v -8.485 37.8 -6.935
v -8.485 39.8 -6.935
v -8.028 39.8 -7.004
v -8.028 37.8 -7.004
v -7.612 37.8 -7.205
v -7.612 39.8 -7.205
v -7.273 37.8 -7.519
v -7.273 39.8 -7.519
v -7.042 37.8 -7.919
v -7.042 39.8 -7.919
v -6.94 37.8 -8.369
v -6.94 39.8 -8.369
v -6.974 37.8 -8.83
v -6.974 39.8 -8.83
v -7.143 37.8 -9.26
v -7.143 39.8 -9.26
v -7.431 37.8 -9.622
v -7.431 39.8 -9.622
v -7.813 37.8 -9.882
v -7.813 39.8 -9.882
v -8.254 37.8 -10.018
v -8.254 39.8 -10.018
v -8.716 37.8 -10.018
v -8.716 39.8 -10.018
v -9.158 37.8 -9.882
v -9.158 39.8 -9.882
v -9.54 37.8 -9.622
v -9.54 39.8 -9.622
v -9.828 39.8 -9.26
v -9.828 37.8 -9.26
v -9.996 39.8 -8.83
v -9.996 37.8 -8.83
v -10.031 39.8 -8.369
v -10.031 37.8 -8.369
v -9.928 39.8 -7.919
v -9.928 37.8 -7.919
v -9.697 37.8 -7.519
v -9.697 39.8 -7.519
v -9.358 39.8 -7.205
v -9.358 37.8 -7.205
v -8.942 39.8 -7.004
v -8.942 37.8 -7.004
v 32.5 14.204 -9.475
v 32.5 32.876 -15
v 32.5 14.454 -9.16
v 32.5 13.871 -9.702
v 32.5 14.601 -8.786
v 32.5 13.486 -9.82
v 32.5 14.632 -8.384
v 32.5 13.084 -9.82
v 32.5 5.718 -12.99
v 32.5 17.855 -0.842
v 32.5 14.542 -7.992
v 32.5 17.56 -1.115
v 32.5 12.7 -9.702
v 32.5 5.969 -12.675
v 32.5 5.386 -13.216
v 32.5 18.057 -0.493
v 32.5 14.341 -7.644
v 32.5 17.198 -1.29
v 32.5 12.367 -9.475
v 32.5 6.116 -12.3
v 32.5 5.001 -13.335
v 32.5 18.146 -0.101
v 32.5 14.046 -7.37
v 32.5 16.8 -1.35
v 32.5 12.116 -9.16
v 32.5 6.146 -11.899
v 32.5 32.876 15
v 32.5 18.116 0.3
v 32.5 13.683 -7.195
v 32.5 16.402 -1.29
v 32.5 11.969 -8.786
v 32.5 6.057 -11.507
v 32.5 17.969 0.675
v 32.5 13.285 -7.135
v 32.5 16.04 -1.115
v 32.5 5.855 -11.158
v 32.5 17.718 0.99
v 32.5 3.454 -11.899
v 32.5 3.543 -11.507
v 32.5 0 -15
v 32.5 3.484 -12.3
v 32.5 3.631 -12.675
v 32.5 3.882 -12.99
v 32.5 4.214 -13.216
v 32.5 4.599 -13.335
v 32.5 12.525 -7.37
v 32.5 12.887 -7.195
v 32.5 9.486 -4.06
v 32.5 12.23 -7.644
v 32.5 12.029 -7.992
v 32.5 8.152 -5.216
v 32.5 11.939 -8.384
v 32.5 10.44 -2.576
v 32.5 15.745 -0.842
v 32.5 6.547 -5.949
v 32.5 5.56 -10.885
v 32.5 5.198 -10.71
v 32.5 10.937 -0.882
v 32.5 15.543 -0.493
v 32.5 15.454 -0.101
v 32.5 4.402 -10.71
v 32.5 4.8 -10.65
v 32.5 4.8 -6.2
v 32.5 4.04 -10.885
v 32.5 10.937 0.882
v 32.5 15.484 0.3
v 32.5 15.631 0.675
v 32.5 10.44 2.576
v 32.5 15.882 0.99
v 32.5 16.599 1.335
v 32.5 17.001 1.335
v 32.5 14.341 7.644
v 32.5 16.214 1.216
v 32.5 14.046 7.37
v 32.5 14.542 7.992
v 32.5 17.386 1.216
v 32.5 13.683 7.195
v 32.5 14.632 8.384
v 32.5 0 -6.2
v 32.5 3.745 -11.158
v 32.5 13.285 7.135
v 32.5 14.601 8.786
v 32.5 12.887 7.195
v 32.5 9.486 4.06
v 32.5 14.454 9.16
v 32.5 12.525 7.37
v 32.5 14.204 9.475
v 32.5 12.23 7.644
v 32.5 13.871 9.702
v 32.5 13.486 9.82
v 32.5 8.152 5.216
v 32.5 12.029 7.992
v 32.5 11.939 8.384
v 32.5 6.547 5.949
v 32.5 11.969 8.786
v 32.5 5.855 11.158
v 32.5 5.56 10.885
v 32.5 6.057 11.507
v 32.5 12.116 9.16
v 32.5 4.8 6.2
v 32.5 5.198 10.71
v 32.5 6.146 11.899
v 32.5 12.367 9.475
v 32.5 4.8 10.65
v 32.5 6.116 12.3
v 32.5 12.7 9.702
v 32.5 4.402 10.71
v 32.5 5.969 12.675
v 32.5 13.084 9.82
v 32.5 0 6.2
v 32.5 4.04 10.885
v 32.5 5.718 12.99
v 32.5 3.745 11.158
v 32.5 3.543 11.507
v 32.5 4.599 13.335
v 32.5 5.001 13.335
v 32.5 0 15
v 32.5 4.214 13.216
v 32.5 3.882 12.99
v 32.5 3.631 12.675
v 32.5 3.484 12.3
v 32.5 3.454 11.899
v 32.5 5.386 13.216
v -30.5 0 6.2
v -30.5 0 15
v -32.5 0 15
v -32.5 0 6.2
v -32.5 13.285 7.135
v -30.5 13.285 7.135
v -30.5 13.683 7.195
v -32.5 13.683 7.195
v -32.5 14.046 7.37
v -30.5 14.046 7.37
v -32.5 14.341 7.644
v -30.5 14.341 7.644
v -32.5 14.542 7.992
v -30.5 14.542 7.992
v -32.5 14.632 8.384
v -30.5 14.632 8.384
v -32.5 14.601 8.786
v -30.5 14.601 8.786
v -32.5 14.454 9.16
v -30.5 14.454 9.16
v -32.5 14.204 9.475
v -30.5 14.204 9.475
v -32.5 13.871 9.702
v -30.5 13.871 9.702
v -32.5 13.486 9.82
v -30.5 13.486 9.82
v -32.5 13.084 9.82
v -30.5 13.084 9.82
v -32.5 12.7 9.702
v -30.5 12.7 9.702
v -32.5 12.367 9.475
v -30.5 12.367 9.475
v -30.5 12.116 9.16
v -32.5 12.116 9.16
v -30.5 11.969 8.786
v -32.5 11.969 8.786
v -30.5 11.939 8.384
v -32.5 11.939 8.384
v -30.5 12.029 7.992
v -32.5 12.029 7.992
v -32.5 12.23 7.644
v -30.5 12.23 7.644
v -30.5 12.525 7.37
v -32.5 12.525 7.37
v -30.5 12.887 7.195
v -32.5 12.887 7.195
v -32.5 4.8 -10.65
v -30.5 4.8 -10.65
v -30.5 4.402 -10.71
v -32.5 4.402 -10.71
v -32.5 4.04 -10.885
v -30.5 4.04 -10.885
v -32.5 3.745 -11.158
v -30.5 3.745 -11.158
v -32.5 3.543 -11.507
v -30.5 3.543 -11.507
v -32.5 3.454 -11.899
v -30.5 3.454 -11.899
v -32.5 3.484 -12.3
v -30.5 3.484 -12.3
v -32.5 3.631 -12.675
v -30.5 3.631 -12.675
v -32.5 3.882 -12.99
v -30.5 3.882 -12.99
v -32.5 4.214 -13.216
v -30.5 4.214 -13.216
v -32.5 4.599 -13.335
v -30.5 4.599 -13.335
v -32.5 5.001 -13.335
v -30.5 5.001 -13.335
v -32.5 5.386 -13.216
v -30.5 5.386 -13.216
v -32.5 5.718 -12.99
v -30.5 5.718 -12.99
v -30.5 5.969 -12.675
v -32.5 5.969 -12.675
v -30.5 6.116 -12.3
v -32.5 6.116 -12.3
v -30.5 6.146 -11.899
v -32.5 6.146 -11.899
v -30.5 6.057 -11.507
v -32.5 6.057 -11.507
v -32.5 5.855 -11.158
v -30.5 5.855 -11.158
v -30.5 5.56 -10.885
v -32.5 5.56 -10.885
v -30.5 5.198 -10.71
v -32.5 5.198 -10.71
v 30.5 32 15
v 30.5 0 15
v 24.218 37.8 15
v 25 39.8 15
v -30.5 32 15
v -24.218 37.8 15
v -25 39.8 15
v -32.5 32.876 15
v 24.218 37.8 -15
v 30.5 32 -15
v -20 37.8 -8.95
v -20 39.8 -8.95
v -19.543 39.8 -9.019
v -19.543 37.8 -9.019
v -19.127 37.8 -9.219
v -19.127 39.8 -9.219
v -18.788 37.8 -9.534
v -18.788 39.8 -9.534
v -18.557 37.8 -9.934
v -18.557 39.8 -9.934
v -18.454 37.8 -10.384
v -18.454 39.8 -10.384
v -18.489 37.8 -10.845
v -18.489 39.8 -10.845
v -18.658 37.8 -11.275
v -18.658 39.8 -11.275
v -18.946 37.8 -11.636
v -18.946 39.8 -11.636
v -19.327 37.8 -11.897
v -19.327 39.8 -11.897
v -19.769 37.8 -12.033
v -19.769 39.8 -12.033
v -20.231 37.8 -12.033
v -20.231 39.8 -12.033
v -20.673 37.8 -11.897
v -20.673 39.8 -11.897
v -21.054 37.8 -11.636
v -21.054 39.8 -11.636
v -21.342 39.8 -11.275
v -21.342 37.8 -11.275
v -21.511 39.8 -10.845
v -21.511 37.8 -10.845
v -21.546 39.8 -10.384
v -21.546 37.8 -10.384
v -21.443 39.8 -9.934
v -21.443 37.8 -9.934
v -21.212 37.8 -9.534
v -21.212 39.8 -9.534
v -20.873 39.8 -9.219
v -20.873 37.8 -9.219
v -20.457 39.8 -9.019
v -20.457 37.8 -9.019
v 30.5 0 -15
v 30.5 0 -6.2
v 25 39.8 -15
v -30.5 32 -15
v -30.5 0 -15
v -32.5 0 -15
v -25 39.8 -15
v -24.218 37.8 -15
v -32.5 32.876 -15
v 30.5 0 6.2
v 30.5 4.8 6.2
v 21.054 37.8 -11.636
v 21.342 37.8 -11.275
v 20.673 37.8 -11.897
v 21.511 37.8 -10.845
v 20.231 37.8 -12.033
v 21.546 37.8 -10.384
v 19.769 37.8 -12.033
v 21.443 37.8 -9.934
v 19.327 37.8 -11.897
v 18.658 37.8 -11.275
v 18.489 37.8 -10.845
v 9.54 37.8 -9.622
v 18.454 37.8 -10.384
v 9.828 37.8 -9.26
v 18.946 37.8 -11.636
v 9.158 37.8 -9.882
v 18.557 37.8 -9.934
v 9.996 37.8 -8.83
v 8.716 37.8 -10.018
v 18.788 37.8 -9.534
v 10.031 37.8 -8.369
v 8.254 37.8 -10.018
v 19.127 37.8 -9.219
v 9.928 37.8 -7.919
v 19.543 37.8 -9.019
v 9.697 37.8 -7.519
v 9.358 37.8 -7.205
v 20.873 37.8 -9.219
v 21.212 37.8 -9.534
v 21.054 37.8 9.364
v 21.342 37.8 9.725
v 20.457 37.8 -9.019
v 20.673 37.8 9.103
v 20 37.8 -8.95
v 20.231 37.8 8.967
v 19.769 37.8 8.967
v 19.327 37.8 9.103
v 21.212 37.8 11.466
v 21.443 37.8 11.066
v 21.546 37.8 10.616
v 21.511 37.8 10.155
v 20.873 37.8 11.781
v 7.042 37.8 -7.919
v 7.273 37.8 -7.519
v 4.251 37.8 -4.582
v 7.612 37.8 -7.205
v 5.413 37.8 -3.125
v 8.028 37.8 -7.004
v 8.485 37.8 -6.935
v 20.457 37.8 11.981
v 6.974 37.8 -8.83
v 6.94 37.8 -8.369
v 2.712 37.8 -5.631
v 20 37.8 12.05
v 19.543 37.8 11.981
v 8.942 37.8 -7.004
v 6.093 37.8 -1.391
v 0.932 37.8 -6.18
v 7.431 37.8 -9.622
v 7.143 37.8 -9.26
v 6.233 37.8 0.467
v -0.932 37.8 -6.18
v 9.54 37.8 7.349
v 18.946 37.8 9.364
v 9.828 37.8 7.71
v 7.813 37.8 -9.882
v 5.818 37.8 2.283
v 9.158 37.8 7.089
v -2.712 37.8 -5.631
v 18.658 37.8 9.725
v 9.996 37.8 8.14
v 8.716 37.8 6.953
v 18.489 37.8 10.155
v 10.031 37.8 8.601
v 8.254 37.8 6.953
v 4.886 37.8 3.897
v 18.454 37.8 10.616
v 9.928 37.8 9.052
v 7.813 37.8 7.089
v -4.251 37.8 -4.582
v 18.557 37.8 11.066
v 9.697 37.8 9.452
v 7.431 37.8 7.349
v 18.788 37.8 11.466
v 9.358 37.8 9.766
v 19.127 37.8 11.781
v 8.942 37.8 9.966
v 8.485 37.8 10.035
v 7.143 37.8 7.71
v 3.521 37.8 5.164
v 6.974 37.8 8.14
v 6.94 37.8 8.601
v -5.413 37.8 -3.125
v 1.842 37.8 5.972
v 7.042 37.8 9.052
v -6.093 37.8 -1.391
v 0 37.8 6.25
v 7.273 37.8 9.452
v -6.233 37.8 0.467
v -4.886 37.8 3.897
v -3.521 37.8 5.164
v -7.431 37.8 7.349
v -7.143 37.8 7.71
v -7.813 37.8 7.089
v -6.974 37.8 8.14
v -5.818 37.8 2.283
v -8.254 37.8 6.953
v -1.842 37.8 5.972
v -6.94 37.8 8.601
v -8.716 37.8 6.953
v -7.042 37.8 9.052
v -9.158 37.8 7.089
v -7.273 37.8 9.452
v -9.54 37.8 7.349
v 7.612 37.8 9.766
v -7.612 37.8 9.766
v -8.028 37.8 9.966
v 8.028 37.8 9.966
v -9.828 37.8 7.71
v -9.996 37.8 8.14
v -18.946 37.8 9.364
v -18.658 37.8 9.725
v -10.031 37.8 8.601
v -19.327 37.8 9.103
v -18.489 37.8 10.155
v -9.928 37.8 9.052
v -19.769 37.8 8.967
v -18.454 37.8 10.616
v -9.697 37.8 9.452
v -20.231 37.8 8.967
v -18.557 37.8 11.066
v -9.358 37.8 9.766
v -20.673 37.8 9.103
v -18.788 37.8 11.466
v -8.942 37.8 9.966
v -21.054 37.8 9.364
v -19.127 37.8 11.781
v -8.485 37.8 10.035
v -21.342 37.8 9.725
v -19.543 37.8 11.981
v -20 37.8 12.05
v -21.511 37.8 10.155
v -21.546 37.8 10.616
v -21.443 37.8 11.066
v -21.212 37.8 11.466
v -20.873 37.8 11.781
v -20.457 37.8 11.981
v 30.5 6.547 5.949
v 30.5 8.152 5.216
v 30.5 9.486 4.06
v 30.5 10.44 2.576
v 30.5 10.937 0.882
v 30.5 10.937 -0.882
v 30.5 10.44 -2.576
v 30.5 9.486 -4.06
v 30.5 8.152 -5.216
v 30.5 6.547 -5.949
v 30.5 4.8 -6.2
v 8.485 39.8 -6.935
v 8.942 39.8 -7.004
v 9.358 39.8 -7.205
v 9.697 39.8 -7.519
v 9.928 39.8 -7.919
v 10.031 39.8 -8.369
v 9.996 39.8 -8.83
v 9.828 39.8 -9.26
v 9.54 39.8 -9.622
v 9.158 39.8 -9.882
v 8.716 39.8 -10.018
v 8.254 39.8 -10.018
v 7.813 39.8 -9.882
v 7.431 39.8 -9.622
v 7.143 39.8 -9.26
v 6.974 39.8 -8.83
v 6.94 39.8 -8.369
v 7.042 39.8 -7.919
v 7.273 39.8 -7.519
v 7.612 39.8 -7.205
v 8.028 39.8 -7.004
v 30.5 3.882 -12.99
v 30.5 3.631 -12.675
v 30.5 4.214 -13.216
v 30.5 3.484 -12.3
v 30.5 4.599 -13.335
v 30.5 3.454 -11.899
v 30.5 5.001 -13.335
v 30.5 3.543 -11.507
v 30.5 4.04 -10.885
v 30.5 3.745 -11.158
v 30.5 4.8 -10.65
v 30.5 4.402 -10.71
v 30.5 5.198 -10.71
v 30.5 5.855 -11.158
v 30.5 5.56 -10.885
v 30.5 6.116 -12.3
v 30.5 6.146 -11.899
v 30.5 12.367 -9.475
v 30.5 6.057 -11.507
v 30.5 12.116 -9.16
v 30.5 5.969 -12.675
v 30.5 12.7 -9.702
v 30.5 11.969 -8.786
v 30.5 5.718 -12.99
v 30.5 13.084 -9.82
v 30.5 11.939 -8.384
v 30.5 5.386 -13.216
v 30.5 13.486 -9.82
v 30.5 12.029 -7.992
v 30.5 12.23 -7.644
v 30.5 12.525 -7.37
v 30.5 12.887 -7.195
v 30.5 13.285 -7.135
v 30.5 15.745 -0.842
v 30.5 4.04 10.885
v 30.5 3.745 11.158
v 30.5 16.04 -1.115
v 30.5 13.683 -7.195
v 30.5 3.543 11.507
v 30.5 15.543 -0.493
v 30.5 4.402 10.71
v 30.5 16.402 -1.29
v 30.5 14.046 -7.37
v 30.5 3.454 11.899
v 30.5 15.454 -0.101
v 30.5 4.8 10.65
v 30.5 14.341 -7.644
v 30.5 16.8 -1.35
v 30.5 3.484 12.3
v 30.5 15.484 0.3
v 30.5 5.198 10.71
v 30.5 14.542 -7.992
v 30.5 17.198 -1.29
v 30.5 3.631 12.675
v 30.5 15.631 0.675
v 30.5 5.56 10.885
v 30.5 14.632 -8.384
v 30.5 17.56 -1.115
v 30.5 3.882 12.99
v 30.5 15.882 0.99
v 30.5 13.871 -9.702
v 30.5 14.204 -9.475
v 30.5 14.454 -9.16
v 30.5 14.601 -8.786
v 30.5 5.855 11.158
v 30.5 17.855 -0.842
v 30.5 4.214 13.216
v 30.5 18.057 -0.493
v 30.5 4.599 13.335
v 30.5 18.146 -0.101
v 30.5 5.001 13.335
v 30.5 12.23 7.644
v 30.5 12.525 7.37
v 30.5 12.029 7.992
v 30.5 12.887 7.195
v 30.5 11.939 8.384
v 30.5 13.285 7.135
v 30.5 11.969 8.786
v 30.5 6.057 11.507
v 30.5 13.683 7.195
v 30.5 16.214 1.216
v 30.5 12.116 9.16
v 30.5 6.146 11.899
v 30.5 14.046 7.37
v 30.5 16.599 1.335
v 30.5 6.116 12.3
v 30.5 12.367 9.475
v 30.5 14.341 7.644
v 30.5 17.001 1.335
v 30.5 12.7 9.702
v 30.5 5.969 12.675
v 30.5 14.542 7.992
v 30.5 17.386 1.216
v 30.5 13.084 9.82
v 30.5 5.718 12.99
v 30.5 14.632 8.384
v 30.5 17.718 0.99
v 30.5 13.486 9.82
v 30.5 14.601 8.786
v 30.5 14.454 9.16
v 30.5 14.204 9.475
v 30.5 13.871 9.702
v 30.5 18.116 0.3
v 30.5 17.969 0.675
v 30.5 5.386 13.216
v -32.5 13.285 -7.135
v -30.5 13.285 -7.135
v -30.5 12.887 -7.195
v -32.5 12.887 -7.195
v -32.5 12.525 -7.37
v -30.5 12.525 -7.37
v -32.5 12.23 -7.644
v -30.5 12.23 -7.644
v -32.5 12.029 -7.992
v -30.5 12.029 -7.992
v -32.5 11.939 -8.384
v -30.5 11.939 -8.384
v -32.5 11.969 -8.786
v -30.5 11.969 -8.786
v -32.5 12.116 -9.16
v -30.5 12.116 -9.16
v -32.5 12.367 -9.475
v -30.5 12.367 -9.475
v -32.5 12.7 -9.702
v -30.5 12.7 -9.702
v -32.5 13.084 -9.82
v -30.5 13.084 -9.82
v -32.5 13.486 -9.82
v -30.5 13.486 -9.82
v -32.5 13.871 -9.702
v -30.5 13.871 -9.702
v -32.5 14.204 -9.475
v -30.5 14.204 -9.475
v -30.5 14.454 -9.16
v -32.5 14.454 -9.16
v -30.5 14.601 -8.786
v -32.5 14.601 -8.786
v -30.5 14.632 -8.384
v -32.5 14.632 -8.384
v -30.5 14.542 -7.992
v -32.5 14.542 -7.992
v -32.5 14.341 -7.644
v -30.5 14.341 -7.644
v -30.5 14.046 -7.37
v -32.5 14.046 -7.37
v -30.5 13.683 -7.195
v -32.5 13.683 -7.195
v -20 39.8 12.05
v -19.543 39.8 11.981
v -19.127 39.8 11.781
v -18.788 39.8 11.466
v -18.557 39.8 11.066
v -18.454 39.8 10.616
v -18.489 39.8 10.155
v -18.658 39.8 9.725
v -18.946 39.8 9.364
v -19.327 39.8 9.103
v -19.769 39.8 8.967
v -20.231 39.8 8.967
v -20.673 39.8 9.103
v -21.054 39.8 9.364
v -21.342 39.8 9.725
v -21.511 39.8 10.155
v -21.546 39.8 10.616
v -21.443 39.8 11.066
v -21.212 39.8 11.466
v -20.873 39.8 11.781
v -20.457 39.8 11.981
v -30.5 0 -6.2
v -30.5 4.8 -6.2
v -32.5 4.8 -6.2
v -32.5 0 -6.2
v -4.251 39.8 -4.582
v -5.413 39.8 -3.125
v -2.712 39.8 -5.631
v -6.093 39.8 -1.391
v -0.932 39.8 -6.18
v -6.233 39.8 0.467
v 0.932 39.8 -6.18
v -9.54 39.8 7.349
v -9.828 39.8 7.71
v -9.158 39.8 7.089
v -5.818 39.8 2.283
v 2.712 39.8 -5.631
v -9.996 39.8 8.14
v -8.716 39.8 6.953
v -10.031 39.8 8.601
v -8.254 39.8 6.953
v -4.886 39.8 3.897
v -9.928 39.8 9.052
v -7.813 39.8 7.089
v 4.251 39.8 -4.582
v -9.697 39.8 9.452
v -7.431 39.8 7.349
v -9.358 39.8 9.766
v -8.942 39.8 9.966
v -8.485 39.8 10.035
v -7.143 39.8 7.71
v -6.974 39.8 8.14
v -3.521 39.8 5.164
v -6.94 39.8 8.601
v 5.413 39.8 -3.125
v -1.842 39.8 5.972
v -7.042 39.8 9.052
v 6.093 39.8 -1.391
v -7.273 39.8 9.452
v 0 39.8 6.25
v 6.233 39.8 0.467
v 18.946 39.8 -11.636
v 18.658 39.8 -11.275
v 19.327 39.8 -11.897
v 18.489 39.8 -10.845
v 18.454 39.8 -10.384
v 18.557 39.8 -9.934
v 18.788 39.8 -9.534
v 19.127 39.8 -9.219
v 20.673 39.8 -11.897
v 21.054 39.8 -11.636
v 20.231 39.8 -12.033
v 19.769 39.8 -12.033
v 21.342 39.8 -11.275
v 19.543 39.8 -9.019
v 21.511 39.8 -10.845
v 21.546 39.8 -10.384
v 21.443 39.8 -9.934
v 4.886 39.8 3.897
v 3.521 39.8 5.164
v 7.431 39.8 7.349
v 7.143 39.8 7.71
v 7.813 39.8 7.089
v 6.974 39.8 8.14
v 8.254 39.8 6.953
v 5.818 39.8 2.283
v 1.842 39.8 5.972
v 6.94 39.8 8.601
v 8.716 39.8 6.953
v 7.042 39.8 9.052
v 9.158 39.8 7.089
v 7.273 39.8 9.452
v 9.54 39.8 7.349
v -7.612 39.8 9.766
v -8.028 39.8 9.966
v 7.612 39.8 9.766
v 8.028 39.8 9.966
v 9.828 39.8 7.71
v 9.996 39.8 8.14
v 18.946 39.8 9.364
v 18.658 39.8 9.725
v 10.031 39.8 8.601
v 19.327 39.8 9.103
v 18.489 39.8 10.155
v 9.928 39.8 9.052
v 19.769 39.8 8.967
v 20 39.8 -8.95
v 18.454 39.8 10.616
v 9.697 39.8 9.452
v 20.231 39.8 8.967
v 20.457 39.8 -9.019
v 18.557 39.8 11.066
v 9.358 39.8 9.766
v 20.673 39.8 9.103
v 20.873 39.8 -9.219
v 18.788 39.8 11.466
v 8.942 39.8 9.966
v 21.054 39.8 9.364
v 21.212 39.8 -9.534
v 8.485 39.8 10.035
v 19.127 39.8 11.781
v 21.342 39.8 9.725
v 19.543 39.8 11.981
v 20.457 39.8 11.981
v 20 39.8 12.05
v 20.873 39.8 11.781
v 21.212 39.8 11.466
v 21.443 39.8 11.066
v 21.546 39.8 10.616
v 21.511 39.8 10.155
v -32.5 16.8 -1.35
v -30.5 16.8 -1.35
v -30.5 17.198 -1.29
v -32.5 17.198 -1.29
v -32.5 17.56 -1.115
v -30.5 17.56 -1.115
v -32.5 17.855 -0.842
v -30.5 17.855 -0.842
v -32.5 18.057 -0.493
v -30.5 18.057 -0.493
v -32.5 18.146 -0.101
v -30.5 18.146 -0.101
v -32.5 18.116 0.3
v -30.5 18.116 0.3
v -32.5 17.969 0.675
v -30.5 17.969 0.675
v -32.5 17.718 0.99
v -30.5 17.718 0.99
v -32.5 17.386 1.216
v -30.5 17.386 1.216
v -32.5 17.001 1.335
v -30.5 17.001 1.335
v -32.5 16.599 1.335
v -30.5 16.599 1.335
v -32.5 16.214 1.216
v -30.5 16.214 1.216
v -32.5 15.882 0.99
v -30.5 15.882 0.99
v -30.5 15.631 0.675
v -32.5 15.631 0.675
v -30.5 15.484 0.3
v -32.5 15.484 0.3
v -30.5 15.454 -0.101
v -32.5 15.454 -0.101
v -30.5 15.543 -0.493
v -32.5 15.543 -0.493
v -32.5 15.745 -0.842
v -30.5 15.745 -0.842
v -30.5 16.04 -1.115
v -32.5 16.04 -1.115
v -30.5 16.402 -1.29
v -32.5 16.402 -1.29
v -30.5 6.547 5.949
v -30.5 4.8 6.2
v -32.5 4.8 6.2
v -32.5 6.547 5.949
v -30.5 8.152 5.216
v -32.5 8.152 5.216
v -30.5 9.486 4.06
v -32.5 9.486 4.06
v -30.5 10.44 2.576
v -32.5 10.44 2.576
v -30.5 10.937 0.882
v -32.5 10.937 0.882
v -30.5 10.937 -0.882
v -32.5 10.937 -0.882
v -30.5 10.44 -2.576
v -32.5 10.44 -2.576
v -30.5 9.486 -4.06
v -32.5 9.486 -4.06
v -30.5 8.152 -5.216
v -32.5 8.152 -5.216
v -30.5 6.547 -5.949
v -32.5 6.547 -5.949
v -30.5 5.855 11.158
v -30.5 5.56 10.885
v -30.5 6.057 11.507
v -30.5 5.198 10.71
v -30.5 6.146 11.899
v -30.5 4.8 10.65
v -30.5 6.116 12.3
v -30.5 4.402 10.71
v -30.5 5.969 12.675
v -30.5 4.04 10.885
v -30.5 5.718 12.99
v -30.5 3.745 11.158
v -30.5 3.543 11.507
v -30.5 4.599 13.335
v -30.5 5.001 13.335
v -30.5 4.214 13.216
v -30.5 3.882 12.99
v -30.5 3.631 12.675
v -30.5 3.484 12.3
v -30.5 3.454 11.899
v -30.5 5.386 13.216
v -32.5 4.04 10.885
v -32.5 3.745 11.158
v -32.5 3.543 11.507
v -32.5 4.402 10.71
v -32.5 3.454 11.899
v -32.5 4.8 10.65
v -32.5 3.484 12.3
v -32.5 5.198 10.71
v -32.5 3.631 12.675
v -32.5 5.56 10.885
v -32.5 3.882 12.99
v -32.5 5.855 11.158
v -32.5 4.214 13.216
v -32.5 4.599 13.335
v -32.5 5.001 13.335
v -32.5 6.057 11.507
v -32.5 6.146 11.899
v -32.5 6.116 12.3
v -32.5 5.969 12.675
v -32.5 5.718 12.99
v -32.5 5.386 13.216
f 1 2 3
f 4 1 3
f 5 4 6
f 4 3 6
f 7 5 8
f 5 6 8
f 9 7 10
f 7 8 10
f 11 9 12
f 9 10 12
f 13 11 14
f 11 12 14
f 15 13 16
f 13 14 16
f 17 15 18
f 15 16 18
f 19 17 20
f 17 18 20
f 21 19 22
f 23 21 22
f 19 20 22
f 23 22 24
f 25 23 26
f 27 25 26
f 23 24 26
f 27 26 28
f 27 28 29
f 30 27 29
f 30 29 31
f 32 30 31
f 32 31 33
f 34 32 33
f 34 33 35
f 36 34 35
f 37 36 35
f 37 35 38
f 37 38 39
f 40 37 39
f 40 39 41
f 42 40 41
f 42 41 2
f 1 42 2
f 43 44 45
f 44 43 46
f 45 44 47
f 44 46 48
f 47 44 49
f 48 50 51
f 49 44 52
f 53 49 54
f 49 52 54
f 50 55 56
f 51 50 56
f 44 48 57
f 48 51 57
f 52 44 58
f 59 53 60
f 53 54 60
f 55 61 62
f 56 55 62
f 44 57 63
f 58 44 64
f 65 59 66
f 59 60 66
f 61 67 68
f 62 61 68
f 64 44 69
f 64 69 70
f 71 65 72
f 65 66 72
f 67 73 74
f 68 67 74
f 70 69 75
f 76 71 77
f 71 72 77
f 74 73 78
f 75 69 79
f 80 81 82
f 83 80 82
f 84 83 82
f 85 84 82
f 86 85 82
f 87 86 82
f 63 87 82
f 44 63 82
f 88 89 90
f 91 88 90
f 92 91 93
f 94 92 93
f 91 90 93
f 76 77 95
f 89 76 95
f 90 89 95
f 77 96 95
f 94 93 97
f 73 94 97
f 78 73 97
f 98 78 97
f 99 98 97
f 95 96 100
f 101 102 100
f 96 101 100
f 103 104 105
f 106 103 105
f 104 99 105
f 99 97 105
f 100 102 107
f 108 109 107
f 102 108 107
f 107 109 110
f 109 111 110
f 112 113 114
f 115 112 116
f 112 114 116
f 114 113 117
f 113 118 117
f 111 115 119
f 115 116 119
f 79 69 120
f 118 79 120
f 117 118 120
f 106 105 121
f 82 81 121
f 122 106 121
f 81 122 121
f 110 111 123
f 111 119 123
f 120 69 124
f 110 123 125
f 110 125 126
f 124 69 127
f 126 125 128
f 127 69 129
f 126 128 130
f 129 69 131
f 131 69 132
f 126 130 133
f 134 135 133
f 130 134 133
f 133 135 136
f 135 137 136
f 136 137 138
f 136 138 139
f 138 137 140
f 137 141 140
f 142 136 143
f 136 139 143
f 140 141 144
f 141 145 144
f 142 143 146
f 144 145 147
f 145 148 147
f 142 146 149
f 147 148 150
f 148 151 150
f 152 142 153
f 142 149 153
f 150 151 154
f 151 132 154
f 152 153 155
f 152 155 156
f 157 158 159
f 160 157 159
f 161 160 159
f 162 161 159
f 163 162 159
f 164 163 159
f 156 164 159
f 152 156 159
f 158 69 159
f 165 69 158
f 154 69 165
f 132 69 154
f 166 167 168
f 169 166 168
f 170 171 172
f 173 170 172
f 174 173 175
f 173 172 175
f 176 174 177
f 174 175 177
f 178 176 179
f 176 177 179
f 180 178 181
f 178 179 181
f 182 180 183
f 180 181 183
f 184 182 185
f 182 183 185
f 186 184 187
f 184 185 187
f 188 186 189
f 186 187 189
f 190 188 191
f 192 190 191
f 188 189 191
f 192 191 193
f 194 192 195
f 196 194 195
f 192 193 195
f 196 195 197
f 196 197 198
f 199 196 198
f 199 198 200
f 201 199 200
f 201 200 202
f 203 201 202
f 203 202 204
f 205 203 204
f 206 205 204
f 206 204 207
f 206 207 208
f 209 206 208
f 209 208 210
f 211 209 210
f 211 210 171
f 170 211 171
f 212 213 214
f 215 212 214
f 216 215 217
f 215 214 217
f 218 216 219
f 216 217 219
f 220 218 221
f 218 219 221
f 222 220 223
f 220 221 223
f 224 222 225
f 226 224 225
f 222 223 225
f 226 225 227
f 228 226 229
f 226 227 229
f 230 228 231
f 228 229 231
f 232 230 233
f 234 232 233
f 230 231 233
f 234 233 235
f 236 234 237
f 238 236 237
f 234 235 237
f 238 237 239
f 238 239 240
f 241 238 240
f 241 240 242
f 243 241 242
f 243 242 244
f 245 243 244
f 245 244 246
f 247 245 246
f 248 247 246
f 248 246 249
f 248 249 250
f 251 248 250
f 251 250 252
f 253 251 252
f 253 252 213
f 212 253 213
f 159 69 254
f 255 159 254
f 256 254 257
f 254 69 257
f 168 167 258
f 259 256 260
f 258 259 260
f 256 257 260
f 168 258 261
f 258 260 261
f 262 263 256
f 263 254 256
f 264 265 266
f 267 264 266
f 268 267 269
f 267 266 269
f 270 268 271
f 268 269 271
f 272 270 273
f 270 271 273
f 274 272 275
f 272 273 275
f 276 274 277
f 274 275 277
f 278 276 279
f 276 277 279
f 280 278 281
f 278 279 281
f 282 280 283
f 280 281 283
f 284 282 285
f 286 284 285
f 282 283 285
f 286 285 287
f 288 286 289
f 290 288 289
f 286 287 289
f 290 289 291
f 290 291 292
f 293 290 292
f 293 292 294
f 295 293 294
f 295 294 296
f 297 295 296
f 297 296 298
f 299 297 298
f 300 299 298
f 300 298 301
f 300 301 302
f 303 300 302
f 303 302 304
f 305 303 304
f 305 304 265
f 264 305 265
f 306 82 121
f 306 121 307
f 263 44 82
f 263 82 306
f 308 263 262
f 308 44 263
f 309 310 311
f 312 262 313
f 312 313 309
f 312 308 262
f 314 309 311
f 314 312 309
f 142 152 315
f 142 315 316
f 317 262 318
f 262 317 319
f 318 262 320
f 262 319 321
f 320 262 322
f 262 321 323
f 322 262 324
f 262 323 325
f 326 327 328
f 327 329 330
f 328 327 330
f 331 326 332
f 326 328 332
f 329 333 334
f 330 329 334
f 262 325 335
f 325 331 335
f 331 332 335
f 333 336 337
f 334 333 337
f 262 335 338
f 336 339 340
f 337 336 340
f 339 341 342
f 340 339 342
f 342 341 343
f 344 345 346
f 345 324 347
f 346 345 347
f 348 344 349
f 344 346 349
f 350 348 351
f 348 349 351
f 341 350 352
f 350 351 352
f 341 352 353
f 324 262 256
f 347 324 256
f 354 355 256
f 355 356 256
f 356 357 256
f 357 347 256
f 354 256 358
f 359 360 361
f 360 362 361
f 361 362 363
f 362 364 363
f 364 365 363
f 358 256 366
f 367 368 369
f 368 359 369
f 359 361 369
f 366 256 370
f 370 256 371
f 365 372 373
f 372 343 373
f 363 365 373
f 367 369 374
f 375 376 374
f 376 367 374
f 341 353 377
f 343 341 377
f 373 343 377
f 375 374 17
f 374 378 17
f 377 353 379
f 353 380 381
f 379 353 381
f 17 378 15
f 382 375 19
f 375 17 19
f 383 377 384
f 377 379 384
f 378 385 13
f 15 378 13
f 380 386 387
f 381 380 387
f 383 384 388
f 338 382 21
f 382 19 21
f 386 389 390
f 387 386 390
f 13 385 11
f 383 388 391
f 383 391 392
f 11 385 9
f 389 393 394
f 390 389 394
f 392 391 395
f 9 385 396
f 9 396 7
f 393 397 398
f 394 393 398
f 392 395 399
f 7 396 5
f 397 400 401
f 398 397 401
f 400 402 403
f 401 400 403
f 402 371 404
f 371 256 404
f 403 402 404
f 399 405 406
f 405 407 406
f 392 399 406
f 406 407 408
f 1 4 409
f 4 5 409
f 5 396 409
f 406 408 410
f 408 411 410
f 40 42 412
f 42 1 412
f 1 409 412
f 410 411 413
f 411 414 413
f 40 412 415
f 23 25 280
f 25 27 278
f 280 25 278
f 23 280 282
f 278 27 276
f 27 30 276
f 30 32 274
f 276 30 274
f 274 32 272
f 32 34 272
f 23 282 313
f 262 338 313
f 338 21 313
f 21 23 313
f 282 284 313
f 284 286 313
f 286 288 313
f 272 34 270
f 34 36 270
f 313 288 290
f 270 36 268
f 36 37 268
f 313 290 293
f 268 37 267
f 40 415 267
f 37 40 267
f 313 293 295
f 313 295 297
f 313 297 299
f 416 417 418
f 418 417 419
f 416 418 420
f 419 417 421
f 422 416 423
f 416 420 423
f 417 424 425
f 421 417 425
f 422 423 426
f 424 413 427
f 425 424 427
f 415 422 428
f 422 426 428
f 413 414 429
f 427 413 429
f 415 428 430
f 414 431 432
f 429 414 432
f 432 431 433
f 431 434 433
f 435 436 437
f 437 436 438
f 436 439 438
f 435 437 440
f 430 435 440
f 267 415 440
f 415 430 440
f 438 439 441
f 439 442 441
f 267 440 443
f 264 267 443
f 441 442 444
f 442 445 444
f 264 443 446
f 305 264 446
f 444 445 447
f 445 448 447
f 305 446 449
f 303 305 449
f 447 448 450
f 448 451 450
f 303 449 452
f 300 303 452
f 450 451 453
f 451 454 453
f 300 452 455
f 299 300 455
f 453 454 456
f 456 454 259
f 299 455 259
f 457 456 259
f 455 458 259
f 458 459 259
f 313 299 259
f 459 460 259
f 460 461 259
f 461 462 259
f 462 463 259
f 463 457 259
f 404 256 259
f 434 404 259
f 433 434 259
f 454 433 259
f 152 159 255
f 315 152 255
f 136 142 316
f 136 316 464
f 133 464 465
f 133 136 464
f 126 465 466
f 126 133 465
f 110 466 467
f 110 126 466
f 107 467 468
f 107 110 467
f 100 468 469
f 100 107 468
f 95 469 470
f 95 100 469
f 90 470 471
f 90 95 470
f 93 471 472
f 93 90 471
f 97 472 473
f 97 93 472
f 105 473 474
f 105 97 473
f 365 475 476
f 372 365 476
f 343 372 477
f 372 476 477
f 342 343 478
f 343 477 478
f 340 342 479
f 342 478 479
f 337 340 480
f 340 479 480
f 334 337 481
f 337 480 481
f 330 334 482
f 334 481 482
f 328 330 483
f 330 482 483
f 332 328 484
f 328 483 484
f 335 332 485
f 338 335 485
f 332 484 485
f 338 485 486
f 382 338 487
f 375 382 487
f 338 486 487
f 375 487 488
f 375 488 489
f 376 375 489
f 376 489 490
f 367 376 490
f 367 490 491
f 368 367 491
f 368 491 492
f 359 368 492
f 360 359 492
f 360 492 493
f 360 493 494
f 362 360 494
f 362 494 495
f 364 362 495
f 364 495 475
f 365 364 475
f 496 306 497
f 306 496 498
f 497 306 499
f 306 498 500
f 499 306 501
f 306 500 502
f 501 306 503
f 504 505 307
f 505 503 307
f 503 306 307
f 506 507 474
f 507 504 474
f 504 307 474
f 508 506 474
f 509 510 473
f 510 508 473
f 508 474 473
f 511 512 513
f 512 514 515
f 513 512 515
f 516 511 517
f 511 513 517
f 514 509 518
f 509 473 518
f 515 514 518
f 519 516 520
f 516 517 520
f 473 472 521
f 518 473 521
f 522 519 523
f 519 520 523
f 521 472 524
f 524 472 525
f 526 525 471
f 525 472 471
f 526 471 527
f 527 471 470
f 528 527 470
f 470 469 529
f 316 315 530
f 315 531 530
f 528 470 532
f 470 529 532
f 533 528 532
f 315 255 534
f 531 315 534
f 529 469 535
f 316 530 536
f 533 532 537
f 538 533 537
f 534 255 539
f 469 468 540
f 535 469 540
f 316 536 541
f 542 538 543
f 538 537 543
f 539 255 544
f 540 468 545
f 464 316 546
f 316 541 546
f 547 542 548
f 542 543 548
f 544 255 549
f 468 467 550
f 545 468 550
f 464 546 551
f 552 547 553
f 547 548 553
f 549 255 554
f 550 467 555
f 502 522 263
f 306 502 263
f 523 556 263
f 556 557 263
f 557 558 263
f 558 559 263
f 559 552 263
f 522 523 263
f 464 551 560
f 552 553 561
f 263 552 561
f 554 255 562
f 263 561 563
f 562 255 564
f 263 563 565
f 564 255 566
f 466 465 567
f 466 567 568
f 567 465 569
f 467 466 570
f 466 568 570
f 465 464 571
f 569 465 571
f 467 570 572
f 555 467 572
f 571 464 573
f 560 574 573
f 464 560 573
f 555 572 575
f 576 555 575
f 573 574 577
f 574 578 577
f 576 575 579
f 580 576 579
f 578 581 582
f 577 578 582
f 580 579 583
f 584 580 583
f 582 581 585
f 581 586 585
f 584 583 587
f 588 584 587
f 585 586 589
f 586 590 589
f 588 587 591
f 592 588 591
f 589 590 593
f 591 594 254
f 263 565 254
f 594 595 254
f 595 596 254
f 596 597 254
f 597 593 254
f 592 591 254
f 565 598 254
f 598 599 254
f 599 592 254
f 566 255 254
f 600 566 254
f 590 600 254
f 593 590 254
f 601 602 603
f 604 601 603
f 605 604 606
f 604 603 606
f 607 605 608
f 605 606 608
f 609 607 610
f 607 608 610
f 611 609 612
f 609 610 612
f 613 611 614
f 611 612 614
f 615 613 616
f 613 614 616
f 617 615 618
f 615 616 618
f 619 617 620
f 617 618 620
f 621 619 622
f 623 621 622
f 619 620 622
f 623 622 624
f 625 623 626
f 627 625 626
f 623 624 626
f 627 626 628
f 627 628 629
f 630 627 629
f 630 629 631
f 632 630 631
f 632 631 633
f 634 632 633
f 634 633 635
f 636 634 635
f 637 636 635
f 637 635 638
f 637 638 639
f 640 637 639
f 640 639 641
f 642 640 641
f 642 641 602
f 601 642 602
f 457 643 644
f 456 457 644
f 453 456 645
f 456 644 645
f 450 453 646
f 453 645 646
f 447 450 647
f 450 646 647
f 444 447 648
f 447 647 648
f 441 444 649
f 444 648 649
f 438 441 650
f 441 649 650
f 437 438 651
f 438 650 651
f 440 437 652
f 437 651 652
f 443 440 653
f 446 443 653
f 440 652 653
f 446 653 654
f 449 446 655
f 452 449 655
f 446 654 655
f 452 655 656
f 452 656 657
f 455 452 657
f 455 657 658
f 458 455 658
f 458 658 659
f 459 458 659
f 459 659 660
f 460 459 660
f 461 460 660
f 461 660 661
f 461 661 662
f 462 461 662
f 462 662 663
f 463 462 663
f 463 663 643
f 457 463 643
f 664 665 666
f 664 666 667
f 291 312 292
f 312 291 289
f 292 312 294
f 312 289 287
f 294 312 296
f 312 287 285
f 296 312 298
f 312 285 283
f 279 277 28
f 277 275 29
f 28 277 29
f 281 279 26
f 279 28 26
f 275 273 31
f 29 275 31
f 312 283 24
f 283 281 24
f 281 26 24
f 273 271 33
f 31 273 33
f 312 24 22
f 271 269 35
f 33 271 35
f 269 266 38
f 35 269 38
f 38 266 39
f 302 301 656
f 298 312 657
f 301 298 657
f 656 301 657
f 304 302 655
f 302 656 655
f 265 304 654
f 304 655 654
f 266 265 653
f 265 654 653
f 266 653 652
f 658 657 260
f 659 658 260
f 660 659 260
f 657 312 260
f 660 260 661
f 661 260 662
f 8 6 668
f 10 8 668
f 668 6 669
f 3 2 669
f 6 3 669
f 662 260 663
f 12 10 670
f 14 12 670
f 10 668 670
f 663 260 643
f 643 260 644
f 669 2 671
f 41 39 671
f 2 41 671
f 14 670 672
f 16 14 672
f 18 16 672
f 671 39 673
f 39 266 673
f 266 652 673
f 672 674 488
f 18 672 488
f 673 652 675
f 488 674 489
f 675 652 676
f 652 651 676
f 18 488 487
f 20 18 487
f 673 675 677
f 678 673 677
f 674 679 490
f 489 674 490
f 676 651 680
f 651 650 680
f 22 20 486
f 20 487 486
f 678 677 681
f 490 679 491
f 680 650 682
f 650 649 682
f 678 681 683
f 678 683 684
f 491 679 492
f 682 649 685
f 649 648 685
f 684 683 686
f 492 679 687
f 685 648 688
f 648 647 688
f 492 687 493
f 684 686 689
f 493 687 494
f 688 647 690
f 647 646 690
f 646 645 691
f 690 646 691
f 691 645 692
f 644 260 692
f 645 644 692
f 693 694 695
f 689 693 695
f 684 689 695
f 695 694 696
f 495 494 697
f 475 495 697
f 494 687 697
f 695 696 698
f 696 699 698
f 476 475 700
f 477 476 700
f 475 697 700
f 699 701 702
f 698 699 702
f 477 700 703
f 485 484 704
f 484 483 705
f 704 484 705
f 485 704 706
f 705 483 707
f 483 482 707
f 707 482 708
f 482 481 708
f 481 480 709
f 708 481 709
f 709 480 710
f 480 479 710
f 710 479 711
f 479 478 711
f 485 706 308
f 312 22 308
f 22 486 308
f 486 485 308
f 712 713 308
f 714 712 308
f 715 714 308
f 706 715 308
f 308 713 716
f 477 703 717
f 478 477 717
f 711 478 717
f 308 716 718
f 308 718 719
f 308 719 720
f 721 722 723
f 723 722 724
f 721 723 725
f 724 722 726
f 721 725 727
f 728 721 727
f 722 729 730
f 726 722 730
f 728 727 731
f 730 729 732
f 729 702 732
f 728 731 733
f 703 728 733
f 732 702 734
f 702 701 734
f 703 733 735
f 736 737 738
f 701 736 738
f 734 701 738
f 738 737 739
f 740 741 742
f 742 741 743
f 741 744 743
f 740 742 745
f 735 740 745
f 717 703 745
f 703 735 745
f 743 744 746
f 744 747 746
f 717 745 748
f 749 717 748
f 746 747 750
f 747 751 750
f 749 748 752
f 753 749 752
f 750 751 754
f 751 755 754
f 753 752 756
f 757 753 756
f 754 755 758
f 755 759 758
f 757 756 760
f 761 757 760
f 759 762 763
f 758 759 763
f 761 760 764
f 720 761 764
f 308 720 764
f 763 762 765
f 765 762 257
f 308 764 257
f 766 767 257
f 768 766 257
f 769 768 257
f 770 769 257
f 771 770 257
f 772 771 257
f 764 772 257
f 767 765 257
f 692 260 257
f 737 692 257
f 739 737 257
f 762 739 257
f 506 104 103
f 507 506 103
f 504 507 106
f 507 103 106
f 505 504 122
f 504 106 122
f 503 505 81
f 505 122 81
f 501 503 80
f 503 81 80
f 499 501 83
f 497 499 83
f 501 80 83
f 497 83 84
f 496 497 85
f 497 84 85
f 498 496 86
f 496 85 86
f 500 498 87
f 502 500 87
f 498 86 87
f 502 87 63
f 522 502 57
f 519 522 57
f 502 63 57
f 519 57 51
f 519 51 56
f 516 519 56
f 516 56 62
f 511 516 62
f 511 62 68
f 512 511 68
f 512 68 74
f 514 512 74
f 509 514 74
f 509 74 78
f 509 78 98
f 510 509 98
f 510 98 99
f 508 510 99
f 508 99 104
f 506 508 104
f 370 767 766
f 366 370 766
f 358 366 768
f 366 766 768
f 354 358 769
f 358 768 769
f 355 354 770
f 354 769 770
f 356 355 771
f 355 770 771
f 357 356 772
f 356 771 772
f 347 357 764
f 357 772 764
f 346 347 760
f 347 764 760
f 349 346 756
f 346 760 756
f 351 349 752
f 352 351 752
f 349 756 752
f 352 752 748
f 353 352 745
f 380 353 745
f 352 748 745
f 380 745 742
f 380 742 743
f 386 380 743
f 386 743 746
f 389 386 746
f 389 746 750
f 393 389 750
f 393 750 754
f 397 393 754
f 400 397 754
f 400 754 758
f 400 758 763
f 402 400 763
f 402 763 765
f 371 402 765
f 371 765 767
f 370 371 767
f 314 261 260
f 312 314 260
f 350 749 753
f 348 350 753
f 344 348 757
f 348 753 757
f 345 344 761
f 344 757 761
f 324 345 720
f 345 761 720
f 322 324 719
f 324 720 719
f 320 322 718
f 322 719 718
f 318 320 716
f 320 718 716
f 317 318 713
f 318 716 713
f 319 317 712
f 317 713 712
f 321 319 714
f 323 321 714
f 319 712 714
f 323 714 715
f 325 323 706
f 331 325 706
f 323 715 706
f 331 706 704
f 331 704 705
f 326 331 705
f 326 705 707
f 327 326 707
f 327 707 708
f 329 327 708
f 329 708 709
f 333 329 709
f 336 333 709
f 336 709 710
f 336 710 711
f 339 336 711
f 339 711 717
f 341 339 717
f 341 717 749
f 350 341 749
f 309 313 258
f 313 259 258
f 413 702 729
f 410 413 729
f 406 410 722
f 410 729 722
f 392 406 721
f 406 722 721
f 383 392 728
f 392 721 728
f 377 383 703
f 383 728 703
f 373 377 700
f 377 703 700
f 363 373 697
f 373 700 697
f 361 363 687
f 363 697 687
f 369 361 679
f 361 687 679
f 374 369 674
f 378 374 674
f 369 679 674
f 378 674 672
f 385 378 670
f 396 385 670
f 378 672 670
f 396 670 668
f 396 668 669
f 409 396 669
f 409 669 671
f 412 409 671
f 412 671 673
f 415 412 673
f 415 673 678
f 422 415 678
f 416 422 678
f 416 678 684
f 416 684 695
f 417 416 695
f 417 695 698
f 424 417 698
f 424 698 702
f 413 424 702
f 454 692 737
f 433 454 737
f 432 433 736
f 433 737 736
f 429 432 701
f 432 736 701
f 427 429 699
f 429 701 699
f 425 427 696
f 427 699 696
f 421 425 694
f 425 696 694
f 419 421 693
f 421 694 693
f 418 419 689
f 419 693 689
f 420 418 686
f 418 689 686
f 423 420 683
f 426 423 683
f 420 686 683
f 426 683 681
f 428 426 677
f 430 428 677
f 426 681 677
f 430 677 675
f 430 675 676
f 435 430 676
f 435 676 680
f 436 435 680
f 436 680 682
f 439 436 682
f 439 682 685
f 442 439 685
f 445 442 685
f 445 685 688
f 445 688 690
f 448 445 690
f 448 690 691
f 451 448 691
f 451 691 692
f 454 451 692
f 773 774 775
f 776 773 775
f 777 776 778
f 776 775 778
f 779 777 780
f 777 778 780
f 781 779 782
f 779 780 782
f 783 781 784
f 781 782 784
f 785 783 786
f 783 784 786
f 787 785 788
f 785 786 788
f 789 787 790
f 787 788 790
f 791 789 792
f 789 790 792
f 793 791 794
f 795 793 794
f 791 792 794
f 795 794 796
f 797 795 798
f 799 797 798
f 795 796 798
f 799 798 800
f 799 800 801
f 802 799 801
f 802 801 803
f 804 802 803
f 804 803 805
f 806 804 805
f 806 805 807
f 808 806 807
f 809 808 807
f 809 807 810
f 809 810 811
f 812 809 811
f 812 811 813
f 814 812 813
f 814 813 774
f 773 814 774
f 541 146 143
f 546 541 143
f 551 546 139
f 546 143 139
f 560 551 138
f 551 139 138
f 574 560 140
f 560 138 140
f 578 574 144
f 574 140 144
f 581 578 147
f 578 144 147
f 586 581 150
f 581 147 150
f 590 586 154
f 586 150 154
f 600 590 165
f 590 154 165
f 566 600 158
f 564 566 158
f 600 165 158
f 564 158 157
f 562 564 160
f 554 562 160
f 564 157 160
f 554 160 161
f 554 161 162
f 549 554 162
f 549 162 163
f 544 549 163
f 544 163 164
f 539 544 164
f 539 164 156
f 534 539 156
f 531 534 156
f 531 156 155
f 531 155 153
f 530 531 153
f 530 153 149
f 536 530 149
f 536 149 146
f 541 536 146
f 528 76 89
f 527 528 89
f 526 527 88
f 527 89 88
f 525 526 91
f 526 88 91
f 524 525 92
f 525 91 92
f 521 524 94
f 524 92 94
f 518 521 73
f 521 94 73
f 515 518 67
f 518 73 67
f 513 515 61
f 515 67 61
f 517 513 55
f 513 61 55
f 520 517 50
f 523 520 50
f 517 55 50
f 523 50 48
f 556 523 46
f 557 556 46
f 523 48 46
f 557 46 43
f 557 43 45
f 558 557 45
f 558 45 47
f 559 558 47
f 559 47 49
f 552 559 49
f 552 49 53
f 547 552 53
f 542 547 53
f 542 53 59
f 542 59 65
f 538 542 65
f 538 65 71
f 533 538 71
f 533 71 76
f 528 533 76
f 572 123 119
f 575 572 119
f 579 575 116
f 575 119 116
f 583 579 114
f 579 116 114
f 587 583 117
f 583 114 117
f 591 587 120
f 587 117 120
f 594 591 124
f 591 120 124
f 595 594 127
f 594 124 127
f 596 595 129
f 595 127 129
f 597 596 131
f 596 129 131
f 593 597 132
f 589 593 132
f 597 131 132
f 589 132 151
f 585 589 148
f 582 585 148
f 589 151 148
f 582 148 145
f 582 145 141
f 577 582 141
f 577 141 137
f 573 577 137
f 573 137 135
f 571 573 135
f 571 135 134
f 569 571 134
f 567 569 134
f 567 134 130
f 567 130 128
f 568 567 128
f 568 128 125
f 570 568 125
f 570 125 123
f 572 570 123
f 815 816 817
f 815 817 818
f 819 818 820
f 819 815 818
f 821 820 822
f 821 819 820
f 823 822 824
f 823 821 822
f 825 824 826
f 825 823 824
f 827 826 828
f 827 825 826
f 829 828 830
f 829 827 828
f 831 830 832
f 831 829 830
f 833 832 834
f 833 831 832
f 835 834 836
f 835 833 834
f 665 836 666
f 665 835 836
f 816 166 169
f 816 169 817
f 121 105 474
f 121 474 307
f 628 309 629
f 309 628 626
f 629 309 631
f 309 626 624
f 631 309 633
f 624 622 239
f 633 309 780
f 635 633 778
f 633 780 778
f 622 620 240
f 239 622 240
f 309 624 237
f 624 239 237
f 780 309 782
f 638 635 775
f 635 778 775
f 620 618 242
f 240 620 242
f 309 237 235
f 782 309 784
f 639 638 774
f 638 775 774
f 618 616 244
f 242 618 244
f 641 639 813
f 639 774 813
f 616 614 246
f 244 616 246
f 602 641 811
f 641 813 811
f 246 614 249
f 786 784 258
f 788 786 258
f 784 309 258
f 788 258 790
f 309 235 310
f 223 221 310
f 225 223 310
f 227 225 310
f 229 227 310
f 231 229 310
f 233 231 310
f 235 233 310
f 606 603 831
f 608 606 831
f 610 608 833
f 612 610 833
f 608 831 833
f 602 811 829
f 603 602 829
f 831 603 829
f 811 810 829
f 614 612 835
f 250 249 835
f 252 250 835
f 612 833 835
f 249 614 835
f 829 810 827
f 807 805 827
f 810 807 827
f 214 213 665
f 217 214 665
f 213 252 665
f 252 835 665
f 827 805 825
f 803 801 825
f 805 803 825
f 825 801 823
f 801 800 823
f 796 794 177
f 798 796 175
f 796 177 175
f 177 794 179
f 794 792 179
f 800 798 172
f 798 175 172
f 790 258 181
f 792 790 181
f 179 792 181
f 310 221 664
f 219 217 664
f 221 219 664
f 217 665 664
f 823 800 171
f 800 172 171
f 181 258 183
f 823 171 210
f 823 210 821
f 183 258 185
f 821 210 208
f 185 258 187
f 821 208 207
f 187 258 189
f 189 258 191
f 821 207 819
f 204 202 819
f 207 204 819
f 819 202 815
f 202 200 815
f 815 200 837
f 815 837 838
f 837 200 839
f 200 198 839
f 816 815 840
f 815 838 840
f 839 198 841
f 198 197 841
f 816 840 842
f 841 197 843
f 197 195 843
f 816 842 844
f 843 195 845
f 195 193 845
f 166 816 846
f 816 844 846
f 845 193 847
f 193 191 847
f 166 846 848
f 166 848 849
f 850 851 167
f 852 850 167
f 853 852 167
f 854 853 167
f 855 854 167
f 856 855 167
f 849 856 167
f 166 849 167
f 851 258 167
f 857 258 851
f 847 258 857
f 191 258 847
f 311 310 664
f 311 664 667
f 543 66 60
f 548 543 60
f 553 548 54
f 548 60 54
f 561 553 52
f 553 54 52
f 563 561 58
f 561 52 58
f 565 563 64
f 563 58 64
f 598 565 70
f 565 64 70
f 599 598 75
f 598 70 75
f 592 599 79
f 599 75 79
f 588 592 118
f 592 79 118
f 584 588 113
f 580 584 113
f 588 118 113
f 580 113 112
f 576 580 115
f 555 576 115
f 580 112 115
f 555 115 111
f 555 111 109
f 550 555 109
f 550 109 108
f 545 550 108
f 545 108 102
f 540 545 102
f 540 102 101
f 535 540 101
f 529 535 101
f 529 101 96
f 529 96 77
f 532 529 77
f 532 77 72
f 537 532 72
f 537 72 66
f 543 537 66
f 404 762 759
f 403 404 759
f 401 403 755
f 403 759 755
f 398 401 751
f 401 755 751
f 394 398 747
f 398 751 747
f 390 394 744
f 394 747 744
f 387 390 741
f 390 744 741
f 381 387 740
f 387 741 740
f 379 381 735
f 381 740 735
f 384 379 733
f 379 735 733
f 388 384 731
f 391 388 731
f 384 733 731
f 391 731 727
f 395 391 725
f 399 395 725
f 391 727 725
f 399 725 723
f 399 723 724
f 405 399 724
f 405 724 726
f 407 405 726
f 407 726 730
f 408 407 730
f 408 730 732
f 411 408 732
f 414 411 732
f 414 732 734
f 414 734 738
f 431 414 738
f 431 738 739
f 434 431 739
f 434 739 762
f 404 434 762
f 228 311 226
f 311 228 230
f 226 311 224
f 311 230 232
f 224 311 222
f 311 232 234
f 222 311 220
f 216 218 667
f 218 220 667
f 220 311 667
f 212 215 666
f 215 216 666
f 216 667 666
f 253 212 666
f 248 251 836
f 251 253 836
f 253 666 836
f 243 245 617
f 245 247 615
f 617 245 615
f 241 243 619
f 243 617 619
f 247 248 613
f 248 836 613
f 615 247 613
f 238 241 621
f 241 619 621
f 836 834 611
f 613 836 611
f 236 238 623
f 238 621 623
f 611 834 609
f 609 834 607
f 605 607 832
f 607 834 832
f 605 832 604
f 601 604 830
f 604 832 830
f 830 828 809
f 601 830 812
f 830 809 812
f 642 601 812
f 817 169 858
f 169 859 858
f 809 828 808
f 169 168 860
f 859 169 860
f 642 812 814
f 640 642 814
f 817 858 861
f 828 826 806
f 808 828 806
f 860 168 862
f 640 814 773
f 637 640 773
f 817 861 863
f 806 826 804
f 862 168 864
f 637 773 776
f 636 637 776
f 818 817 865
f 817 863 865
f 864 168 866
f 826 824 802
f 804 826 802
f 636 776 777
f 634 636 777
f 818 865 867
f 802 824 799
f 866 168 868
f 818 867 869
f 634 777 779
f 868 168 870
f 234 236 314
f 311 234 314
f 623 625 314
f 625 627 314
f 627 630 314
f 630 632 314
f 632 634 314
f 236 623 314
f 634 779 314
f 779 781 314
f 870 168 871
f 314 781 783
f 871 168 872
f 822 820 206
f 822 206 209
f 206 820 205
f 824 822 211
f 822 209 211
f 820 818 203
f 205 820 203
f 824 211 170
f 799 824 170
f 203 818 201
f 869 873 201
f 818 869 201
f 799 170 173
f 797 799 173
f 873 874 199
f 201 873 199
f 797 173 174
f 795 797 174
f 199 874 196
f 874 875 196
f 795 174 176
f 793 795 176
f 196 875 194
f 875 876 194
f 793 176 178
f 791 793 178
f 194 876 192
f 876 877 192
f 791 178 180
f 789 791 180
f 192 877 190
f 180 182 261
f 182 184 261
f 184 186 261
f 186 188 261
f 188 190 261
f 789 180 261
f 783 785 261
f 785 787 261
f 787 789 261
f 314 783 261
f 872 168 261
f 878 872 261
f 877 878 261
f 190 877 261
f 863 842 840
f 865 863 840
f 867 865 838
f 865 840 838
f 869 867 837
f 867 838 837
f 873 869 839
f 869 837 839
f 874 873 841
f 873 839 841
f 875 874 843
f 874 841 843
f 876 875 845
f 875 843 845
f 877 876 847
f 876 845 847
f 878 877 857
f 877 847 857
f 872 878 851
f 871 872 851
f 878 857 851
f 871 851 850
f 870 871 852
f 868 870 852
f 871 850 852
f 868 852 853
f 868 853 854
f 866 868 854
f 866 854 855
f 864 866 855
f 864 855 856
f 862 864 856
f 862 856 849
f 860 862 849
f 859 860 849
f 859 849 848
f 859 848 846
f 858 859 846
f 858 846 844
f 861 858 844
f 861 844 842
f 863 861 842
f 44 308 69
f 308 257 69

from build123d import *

# Parameters (mm, degrees)
BOSS_EXTRU_1_DEPTH      = 15
ESQUISSE3_R             = 6.25
ESQUISSE3_R_2           = 1.55
ENL_V_MAT_EXTRU_1_DEPTH = 54.528403675
ESQUISSE4_R             = 1.35
ENL_V_MAT_EXTRU_2_DEPTH = 78.679083414


with BuildPart() as part:
    # Esquisse1 → Boss.-Extru.1 (new, symmetric)
    with BuildSketch(Plane.XY):
        Polygon((-25, 39.8), (25, 39.8), (32.5, 32.875544179), (32.5, 0), (30.5, 0), (30.5, 32), (24.217917895, 37.8), (-24.217917895, 37.8), (-30.5, 32), (-30.5, 0), (-32.5, 0), (-32.5, 32.875544179), align=None)
    extrude(amount=BOSS_EXTRU_1_DEPTH, both=True)

    # Esquisse3 → Enlèv. mat.-Extru.1 (cut, through all)
    with BuildSketch(Plane(origin=(0, 39.8, 0), x_dir=(1, 0, 0), z_dir=(0, 1, 0))):
        with Locations(Location((0, 0, 0), (0, 0, 270))):
            Circle(ESQUISSE3_R)
        with Locations(Location((-8.485281374, 8.485281374, 0), (0, 0, 270))):
            Circle(ESQUISSE3_R_2)
        with Locations(Location((-8.485281374, -8.485281374, 0), (0, 0, 270))):
            Circle(ESQUISSE3_R_2)
        with Locations(Location((8.485281374, -8.485281374, 0), (0, 0, 270))):
            Circle(ESQUISSE3_R_2)
        with Locations(Location((8.485281374, 8.485281374, 0), (0, 0, 270))):
            Circle(ESQUISSE3_R_2)
        with Locations(Location((20, 10.5, 0), (0, 0, 270))):
            Circle(ESQUISSE3_R_2)
        with Locations(Location((-20, 10.5, 0), (0, 0, 270))):
            Circle(ESQUISSE3_R_2)
        with Locations(Location((20, -10.5, 0), (0, 0, 270))):
            Circle(ESQUISSE3_R_2)
        with Locations(Location((-20, -10.5, 0), (0, 0, 270))):
            Circle(ESQUISSE3_R_2)
    extrude(amount=-ENL_V_MAT_EXTRU_1_DEPTH, mode=Mode.SUBTRACT)

    # Esquisse4 → Enlèv. mat.-Extru.2 (cut, through all)
    with BuildSketch(Plane(origin=(32.5, 0, 0), x_dir=(0, 0, -1), z_dir=(1, 0, 0))):
        with Locations((-12, 4.8)):
            Circle(ESQUISSE4_R)
        with Locations((0, 16.8)):
            Circle(ESQUISSE4_R)
        with Locations((-8.485281374, 13.285281374)):
            Circle(ESQUISSE4_R)
        with Locations(Location((12, 4.8, 0), (0, 0, 180))):
            Circle(ESQUISSE4_R)
        with Locations(Location((8.485281374, 13.285281374, 0), (0, 0, 180))):
            Circle(ESQUISSE4_R)
        with BuildLine():
            Line((-6.2, 0), (-6.2, 4.8))
            ThreePointArc((-6.2, 4.8), (0, 11), (6.2, 4.8))
            Line((6.2, 4.8), (6.2, 0))
            Line((6.2, 0), (-6.2, 0))
        make_face()
    extrude(amount=-ENL_V_MAT_EXTRU_2_DEPTH, mode=Mode.SUBTRACT)


solid = part.part
